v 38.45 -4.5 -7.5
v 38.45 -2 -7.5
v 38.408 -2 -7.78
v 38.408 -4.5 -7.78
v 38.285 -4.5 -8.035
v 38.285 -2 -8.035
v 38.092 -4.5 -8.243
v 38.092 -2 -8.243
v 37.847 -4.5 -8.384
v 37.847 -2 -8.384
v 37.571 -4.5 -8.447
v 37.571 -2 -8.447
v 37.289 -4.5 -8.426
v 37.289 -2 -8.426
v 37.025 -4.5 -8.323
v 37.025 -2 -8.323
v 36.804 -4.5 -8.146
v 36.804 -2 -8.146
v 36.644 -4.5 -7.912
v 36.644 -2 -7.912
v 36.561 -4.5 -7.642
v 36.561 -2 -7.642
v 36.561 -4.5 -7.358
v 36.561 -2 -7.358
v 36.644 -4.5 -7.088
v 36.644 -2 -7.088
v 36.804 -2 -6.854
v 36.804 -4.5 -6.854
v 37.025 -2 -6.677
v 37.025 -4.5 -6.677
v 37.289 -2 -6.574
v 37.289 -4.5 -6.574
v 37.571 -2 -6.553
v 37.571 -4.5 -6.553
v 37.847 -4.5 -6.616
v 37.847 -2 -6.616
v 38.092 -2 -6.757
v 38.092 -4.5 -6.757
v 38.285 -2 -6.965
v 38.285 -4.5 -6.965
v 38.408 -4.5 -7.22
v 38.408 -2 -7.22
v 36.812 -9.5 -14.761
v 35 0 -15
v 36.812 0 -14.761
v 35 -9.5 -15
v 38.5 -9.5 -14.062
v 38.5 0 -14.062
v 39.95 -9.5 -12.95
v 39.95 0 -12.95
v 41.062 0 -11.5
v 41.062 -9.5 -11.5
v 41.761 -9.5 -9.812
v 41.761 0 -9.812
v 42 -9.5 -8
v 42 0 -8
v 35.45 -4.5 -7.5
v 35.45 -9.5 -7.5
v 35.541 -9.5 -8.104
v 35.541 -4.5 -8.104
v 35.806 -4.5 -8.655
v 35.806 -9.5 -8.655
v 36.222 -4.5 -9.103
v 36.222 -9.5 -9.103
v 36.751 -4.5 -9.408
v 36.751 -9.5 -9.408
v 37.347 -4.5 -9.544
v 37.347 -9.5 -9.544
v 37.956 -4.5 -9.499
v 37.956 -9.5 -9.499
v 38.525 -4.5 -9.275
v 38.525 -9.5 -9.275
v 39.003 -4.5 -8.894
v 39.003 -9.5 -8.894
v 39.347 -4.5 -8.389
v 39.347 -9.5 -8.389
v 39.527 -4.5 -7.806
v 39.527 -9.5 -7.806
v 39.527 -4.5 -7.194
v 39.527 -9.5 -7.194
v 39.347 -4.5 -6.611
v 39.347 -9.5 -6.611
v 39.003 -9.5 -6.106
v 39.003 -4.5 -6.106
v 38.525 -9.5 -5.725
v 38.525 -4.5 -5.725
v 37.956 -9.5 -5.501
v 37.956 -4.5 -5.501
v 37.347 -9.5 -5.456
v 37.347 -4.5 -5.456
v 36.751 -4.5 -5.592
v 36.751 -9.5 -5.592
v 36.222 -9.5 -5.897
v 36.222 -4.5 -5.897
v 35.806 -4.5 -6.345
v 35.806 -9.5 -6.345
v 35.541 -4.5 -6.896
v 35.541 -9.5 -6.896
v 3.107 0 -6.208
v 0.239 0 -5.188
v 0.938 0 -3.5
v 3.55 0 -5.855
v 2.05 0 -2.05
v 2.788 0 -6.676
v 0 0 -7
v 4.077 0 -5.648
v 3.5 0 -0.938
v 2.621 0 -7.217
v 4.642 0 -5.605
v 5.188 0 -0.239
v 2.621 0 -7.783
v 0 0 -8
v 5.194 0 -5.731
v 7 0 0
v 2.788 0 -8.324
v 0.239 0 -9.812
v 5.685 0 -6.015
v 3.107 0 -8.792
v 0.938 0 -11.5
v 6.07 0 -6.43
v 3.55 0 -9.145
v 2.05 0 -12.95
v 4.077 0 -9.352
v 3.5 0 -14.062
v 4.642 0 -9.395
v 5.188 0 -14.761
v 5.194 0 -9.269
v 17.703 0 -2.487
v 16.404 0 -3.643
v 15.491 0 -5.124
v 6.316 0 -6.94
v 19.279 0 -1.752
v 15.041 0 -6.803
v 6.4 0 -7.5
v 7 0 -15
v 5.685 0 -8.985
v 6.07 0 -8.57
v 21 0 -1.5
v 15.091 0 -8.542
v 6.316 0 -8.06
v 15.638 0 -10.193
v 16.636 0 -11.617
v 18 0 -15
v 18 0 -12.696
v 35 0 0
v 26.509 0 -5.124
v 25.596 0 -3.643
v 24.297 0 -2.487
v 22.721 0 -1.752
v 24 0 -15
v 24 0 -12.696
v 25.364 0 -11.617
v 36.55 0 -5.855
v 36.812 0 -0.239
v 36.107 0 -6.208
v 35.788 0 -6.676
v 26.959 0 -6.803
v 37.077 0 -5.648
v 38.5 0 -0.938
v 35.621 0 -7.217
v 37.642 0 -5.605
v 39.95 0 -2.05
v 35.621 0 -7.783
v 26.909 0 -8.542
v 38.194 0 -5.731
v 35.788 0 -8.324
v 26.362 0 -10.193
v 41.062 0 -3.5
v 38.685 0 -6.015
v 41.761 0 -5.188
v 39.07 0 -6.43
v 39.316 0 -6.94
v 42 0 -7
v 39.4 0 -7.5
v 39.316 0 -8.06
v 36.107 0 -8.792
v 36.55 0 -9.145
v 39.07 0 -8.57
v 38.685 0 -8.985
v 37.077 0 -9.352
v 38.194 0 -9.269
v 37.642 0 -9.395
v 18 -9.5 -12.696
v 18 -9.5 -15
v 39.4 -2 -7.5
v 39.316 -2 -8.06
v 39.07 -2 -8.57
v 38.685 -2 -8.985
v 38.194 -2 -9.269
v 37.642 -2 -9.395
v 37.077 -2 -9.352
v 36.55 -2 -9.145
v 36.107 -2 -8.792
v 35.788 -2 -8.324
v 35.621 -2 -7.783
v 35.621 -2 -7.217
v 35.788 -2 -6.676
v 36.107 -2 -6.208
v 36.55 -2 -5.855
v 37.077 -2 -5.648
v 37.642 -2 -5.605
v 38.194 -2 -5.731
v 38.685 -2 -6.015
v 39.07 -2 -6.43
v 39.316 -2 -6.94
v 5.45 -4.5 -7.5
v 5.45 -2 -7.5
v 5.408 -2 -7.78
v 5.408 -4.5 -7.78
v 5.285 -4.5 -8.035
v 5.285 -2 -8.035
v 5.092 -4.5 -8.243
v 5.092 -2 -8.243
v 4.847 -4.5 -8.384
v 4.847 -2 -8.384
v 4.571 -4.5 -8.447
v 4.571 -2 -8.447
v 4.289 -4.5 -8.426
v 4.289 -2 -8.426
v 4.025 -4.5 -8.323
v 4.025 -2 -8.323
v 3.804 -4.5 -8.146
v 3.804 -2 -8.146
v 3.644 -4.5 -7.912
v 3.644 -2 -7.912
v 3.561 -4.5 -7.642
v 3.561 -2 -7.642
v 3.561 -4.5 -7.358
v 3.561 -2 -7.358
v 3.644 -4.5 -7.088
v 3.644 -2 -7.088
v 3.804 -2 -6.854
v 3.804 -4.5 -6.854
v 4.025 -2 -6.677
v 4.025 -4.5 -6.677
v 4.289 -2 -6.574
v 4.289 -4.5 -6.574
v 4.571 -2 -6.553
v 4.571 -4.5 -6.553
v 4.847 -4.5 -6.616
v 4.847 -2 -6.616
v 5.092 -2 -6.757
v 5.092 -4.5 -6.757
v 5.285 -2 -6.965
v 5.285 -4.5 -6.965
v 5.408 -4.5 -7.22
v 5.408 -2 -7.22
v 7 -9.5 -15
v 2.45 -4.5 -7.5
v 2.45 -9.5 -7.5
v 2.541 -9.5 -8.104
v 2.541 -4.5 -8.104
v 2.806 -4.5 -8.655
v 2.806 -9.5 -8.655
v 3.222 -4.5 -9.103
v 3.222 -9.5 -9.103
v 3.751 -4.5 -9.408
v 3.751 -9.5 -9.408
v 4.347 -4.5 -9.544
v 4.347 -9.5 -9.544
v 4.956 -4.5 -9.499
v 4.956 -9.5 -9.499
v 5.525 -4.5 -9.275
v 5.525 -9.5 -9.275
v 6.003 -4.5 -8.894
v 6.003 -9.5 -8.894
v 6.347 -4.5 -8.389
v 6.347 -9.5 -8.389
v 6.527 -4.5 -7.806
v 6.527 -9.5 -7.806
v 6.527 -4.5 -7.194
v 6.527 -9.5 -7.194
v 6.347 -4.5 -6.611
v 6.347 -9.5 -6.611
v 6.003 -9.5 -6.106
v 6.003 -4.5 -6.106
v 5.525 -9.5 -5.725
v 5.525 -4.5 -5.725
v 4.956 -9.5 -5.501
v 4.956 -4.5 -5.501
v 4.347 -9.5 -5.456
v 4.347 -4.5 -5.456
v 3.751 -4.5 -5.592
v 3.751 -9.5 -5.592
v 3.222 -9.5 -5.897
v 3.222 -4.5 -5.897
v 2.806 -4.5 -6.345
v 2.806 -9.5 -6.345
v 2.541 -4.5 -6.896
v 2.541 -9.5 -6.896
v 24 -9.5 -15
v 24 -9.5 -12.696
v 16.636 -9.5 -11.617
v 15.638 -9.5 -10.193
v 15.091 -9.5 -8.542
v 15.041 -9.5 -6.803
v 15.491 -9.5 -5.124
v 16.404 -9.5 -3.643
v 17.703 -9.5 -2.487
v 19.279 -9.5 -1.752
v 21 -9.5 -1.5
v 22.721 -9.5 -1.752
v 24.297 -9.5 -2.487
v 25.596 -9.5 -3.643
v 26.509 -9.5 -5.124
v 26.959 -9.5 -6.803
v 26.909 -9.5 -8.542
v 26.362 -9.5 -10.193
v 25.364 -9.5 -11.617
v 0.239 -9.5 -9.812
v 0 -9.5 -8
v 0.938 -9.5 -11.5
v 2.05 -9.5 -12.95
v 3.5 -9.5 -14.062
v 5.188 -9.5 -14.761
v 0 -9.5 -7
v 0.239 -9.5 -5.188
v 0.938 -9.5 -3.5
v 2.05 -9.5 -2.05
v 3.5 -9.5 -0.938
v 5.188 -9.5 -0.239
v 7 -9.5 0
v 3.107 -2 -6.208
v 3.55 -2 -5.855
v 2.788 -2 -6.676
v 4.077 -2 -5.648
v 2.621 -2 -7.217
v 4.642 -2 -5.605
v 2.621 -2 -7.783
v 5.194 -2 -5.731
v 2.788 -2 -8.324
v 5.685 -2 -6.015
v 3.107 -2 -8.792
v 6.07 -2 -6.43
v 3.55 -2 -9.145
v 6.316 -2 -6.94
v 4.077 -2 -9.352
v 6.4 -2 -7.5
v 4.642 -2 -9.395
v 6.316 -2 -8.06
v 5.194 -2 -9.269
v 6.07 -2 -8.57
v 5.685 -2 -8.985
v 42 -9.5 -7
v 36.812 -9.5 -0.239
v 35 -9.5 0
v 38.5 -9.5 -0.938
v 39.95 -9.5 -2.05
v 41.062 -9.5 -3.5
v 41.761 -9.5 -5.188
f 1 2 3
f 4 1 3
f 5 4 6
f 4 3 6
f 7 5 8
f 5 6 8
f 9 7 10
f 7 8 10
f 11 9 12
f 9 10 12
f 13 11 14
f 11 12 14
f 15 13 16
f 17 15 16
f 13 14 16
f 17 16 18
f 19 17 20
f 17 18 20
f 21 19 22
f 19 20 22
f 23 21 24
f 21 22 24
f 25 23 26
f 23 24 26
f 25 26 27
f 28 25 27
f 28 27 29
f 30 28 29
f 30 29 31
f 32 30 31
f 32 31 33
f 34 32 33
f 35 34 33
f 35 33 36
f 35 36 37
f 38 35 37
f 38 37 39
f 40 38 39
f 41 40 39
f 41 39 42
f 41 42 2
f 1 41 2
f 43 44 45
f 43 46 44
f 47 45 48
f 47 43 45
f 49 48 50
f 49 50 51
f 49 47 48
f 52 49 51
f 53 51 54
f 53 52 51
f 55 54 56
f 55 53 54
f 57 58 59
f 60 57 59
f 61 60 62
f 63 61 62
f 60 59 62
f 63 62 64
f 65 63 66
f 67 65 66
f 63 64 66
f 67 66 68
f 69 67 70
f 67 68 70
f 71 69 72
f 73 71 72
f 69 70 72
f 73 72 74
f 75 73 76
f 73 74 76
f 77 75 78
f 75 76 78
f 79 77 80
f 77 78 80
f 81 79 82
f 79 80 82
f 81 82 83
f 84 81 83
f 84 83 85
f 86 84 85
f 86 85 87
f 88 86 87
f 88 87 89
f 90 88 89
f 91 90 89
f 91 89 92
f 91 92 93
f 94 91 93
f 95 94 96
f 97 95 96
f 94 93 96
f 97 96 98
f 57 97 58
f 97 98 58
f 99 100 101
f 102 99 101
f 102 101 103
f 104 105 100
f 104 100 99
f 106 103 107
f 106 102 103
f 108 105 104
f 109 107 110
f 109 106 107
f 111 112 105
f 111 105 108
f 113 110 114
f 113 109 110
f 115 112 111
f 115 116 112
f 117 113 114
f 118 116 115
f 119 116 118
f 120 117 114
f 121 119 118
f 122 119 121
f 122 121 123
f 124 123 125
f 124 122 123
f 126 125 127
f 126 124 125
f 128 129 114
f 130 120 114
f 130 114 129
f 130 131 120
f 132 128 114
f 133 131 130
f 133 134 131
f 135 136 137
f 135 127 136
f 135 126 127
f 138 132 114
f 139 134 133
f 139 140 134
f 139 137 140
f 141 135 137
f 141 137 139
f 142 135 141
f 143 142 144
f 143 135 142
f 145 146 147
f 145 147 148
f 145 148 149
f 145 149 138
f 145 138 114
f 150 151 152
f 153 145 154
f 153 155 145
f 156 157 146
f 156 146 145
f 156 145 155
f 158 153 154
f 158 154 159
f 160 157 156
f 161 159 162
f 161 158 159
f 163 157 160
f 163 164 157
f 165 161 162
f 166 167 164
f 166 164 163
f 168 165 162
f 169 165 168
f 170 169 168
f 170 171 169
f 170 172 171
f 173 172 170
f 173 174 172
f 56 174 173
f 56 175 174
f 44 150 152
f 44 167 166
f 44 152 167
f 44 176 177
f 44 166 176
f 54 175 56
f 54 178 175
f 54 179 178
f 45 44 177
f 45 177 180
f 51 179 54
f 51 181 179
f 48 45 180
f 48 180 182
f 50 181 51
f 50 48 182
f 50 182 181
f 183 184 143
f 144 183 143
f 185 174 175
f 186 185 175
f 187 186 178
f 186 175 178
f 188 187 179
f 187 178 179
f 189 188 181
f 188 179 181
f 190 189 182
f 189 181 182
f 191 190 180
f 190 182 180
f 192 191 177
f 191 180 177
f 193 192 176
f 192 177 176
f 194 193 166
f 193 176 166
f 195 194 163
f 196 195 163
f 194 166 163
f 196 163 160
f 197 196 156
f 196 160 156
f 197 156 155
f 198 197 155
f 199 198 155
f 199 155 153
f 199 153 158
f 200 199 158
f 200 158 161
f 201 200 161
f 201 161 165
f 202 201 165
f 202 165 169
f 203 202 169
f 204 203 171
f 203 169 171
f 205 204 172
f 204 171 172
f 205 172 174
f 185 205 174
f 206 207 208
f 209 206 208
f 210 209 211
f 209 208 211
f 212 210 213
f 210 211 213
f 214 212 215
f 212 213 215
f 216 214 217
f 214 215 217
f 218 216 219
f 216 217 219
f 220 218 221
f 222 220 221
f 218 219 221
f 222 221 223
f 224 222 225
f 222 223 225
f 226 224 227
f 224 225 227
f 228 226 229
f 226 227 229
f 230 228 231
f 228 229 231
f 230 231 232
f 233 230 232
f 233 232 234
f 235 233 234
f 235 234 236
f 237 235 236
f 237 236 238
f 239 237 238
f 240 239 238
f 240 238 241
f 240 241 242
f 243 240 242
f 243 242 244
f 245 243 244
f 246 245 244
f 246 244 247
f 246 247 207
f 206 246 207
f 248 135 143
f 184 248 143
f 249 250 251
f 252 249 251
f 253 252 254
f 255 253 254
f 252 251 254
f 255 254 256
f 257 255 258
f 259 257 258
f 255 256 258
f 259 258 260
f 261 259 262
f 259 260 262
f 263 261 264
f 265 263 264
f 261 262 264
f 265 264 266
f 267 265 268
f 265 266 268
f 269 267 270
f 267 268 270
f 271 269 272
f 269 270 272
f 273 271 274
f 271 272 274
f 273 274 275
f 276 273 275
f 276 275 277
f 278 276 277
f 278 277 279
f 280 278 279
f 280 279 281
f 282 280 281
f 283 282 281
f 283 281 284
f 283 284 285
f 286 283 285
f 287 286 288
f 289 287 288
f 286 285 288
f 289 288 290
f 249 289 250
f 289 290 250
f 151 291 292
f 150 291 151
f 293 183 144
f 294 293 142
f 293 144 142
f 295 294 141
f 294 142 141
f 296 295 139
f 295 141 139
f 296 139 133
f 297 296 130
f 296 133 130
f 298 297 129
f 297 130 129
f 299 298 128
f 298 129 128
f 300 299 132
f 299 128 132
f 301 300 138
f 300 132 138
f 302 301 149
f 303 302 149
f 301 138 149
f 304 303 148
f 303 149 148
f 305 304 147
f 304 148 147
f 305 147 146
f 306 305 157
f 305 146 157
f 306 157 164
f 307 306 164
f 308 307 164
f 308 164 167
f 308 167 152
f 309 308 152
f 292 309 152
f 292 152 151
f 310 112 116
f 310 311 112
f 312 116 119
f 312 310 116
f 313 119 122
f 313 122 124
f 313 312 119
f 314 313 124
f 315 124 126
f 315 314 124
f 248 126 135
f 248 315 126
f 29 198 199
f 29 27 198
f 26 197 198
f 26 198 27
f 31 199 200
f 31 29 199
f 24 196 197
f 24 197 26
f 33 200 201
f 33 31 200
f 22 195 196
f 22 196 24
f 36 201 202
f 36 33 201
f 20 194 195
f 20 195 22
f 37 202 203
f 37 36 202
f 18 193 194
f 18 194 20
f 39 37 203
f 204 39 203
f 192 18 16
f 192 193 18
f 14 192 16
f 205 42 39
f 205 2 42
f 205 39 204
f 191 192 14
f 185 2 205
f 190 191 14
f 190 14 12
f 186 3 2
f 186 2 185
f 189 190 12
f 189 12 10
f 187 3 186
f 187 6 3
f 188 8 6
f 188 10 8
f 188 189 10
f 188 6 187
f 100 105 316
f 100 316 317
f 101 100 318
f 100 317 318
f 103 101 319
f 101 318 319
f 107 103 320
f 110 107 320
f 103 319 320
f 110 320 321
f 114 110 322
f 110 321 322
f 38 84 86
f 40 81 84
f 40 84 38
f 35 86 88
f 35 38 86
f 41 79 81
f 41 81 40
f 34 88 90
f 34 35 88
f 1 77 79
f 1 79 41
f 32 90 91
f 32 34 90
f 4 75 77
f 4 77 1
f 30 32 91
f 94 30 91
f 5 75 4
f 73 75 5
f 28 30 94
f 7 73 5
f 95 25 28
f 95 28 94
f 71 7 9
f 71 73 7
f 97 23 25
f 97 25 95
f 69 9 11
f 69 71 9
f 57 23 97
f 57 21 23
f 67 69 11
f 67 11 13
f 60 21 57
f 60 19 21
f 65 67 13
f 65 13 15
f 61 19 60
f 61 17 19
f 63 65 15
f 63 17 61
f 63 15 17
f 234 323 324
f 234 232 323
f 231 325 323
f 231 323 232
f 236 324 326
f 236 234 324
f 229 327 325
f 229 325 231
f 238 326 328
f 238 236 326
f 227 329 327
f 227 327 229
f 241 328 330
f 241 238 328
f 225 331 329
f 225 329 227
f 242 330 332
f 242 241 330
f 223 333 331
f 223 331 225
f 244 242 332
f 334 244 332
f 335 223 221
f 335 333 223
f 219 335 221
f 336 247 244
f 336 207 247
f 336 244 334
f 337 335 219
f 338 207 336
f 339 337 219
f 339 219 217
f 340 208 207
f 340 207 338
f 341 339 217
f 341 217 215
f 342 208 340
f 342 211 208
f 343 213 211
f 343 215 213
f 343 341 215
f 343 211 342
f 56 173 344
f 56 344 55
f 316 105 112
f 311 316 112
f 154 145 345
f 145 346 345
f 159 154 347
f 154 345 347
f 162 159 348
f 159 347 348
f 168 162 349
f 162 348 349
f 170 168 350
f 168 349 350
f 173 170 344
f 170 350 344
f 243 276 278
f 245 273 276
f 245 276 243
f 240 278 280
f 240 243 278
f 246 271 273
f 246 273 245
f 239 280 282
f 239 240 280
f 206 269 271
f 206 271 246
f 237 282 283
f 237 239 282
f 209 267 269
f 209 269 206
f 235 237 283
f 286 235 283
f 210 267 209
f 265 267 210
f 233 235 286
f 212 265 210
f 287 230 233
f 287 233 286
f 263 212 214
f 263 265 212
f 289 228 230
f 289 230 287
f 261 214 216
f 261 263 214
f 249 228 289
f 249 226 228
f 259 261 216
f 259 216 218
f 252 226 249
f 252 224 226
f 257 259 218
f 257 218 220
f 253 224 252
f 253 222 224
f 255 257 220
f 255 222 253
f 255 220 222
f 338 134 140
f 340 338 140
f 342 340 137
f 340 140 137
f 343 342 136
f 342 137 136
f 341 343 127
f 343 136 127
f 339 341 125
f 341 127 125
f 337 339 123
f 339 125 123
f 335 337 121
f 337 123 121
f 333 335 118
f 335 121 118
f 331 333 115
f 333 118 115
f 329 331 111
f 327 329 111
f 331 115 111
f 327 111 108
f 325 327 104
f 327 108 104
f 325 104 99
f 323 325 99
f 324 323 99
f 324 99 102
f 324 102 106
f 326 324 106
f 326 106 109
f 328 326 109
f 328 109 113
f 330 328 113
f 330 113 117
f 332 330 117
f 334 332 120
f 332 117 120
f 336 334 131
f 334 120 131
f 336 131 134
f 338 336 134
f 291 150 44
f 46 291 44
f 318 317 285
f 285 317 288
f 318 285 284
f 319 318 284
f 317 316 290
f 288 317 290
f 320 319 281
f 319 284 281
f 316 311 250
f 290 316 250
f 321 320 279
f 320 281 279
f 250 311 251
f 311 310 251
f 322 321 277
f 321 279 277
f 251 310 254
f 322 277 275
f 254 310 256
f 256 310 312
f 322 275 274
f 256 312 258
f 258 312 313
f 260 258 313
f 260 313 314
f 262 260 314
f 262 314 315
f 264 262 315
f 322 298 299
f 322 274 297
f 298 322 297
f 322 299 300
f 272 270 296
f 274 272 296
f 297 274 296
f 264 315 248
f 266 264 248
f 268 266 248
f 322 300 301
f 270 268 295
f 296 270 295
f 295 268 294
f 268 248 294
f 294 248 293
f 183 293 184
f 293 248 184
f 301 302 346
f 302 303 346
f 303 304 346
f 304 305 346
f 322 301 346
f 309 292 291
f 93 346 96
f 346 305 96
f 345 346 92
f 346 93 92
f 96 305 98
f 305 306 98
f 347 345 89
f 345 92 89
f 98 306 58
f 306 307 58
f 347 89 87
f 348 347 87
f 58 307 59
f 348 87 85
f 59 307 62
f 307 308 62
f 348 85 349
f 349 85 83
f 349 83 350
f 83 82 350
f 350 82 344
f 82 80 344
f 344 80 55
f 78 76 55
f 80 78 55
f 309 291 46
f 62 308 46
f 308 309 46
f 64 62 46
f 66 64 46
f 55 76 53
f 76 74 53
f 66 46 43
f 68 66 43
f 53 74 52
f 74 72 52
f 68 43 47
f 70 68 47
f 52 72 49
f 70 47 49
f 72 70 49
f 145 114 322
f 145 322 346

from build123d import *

# Parameters (mm, degrees)
SKETCH1_W           = 42
SKETCH1_H           = 15
BOSS_EXTRUDE1_DEPTH = 9.5
CUT_EXTRUDE1_REACH  = 11.5
SKETCH2_R           = 6
SKETCH4_R           = 1.9
CUT_EXTRUDE3_DEPTH  = 2
SKETCH5_R           = 2.05
CUT_EXTRUDE4_DEPTH  = 5
SKETCH6_R           = 0.95
CUT_EXTRUDE5_DEPTH  = 3
FILLET1_R           = 7
SKETCH7_W           = 6
SKETCH7_H           = 9.5
CUT_EXTRUDE6_DEPTH  = 3


with BuildPart() as part:
    # Sketch1 → Boss-Extrude1 (new body)
    with BuildSketch(Plane(origin=(0, 0, 0), x_dir=(1, 0, 0), z_dir=(0, 1, 0))):
        with Locations((21, 7.5)):
            Rectangle(SKETCH1_W, SKETCH1_H)
    extrude(amount=-BOSS_EXTRUDE1_DEPTH)

    # Sketch2 → Cut-Extrude1 (cut, up to next)
    with BuildSketch(Plane(origin=(0, 0, 0), x_dir=(1, 0, 0), z_dir=(0, 1, 0)), mode=Mode.PRIVATE) as cut_extrude1_sk1:
        with Locations((21, 7.5)):
            Circle(SKETCH2_R)
    cut_extrude1_tool1 = extrude(cut_extrude1_sk1.sketch, amount=-CUT_EXTRUDE1_REACH, mode=Mode.PRIVATE) & part.part
    add(cut_extrude1_tool1.solids().sort_by_distance((21, 0, -7.5))[0], mode=Mode.SUBTRACT)

    # Sketch4 → Cut-Extrude3 (cut)
    with BuildSketch(Plane(origin=(0, 0, 0), x_dir=(1, 0, 0), z_dir=(0, 1, 0))):
        with Locations((4.5, 7.5)):
            Circle(SKETCH4_R)
        with Locations((37.5, 7.5)):
            Circle(SKETCH4_R)
    extrude(amount=-CUT_EXTRUDE3_DEPTH, mode=Mode.SUBTRACT)

    # Sketch5 → Cut-Extrude4 (cut)
    with BuildSketch(Plane(origin=(0, -9.5, 0), x_dir=(-1, 0, 0), z_dir=(0, -1, 0))):
        with Locations((-37.5, 7.5)):
            Circle(SKETCH5_R)
        with Locations((-4.5, 7.5)):
            Circle(SKETCH5_R)
    extrude(amount=-CUT_EXTRUDE4_DEPTH, mode=Mode.SUBTRACT)

    # Sketch6 → Cut-Extrude5 (cut)
    with BuildSketch(Plane(origin=(0, -2, 0), x_dir=(1, 0, 0), z_dir=(0, 1, 0))):
        with Locations((4.5, 7.5)):
            Circle(SKETCH6_R)
        with Locations((37.5, 7.5)):
            Circle(SKETCH6_R)
    extrude(amount=-CUT_EXTRUDE5_DEPTH, mode=Mode.SUBTRACT)

    # Fillet1
    fillet1_edges = [part.edges().sort_by_distance(p)[0] for p in [
        (0, -4.75, -15),
        (42, -4.75, -15),
        (42, -4.75, 0),
        (0, -4.75, 0),
    ]]
    fillet(fillet1_edges, radius=FILLET1_R)

    # Sketch7 → Cut-Extrude6 (cut)
    with BuildSketch(Plane(origin=(0, 0, -15), x_dir=(-1, 0, 0), z_dir=(0, 0, -1))):
        with Locations((-21, -4.75)):
            Rectangle(SKETCH7_W, SKETCH7_H)
    extrude(amount=-CUT_EXTRUDE6_DEPTH, mode=Mode.SUBTRACT)


solid = part.part
